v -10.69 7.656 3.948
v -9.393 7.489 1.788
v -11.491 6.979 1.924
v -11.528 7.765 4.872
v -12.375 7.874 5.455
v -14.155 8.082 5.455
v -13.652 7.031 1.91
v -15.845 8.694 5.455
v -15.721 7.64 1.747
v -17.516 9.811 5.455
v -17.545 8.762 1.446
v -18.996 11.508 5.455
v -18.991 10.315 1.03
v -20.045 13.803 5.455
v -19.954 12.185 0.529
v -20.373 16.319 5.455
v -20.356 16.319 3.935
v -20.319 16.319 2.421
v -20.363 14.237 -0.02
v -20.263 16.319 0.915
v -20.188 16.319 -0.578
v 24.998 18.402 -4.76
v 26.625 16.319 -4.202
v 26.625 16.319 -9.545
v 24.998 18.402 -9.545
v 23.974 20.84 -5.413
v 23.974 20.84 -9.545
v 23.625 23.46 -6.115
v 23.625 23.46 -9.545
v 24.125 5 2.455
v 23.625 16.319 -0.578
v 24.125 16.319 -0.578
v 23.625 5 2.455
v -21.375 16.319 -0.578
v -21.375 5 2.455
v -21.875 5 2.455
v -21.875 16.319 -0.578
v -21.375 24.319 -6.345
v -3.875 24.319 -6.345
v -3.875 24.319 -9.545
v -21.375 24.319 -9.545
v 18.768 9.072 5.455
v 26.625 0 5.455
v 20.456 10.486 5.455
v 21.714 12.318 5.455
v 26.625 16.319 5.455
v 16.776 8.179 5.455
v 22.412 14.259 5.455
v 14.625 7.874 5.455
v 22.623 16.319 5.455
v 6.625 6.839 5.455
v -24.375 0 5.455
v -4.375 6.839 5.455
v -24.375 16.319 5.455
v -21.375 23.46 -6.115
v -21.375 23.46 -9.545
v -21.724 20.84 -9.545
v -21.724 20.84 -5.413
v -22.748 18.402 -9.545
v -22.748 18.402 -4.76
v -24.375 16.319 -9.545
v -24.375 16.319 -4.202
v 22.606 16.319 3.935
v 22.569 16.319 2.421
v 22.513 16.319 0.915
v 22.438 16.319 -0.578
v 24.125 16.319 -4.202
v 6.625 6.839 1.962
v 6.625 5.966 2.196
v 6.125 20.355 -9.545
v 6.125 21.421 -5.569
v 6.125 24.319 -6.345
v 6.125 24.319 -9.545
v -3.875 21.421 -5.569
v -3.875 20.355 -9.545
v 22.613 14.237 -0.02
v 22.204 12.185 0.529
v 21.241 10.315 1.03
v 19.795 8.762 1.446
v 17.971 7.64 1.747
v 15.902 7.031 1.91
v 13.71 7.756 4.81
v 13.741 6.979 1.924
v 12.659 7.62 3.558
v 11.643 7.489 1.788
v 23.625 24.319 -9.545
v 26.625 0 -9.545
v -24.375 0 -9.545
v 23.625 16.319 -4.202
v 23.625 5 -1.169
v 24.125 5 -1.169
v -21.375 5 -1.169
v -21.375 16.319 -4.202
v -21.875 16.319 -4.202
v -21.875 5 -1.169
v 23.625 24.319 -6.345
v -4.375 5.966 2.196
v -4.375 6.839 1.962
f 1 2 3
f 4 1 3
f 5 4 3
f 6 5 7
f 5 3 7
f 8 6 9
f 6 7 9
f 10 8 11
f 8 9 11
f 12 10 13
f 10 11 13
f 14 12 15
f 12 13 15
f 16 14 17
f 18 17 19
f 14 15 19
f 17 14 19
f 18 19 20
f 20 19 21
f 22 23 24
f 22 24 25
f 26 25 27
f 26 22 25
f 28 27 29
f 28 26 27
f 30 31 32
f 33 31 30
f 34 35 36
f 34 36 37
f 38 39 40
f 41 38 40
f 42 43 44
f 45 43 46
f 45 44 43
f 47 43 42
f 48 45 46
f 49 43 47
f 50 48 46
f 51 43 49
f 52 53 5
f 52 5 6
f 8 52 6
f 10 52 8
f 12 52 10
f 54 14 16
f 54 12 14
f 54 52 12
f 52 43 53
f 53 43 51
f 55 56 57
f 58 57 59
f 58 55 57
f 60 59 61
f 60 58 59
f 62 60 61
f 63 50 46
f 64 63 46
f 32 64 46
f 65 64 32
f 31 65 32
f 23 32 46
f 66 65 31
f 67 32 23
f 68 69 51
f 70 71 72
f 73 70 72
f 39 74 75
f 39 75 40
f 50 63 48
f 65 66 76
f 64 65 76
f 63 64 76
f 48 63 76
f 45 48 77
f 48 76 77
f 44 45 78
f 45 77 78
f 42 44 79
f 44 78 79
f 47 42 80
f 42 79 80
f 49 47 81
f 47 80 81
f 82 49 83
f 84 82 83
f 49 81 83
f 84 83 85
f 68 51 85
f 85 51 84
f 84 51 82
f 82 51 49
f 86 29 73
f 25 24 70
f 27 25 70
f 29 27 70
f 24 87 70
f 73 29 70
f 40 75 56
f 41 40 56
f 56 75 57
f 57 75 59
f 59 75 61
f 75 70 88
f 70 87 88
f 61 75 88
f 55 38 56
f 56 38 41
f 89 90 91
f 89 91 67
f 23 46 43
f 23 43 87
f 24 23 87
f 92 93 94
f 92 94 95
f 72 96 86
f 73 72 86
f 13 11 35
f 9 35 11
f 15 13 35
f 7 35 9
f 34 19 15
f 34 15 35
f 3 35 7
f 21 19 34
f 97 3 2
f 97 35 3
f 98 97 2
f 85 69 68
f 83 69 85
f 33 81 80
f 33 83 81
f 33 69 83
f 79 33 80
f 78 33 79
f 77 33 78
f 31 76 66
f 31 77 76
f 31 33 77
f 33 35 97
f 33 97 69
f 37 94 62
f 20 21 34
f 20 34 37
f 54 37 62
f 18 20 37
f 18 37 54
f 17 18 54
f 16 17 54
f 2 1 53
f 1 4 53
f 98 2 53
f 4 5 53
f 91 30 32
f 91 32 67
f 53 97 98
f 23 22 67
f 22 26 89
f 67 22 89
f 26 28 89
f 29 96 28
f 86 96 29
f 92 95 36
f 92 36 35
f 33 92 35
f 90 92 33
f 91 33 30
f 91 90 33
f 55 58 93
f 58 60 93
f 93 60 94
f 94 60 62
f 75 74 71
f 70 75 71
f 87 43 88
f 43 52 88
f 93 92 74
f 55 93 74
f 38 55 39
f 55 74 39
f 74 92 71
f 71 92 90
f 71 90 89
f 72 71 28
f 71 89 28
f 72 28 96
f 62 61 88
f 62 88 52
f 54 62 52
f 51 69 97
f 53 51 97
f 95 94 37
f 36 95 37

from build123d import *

# Parameters (mm, degrees)
SKETCH1_W           = 45
SKETCH1_H           = 15
BOSS_EXTRUDE1_DEPTH = 5
BOSS_EXTRUDE2_DEPTH = 45
SKETCH5_R           = 8
CUT_EXTRUDE1_DEPTH  = 10
CUT_EXTRUDE2_REACH  = 39.075
SKETCH6_W           = 45
SKETCH6_H           = 8
SKETCH7_W           = 11
SKETCH7_H           = 10.717790556
CUT_EXTRUDE4_DEPTH  = 6.5
CUT_EXTRUDE5_REACH  = 39.075
SKETCH10_W          = 15
SKETCH10_H          = 16.318516526
BOSS_EXTRUDE3_DEPTH = 3
SKETCH11_W          = 15
SKETCH11_H          = 16.318516526
BOSS_EXTRUDE4_DEPTH = 3
SKETCH12_W          = 10
SKETCH12_H          = 7.679226714
CUT_EXTRUDE6_DEPTH  = 6
FILLET1_R           = 10
CUT_EXTRUDE7_DEPTH  = 0.5
CUT_EXTRUDE8_DEPTH  = 0.5


with BuildPart() as part:
    # Sketch1 → Boss-Extrude1 (new body)
    with BuildSketch(Plane(origin=(0, 0, 0), x_dir=(1, 0, 0), z_dir=(0, 1, 0))):
        with Locations((1.125, 2.045454545)):
            Rectangle(SKETCH1_W, SKETCH1_H)
    extrude(amount=BOSS_EXTRUDE1_DEPTH)

    # Sketch2 → Boss-Extrude2 (add)
    with BuildSketch(Plane(origin=(23.625, 0, 0), x_dir=(0, 0, -1), z_dir=(1, 0, 0))):
        Polygon((-2.454545455, 5), (2.721835448, 24.318516526), (-5.454545455, 24.318516526), (-5.454545455, 5), align=None)
        Polygon((1.168921177, 5), (6.345302079, 24.318516526), (9.545454545, 24.318516526), (9.545454545, 5), align=None)
    extrude(amount=-BOSS_EXTRUDE2_DEPTH)

    # Sketch5 → Cut-Extrude1 (cut)
    with BuildSketch(Plane(origin=(0, 0.948572854, 3.540122086), x_dir=(-1, 0, 0), z_dir=(0, -0.2588190451025247, -0.9659258262890673))):
        with Locations(Location((12.375, 14.194346021, 0), (0, 0, 90))):
            Circle(SKETCH5_R)
        with Locations(Location((-14.625, 14.194346021, 0), (0, 0, 90))):
            Circle(SKETCH5_R)
    extrude(amount=-CUT_EXTRUDE1_DEPTH, mode=Mode.SUBTRACT)

    # Cut-Extrude2: up to this plane
    cut_extrude2_end = Plane(origin=(-21.375, 5, 2.454545455), z_dir=(0, -0.2588190451025246, -0.9659258262890673))
    # Sketch6 → Cut-Extrude2 (cut, up to the surface)
    with BuildSketch(Plane.XY.offset(5.454545455), mode=Mode.PRIVATE) as cut_extrude2_sk1:
        with Locations((1.125, 20.318516526)):
            Rectangle(SKETCH6_W, SKETCH6_H)
    cut_extrude2_tool1 = split(extrude(cut_extrude2_sk1.sketch, amount=-CUT_EXTRUDE2_REACH, mode=Mode.PRIVATE), bisect_by=cut_extrude2_end, keep=Keep.BOTH, mode=Mode.PRIVATE)
    add(cut_extrude2_tool1.solids().sort_by_distance((1.125, 20.318517, 5.454545))[0], mode=Mode.SUBTRACT)

    # Sketch7 → Cut-Extrude4 (cut)
    with BuildSketch(Plane(origin=(0, 0.948572854, 3.540122086), x_dir=(-1, 0, 0), z_dir=(0, -0.2588190451025247, -0.9659258262890673))):
        with Locations((-1.125, 10.553241299)):
            Rectangle(SKETCH7_W, SKETCH7_H)
    extrude(amount=-CUT_EXTRUDE4_DEPTH, mode=Mode.SUBTRACT)


with BuildPart() as cut_extrude4_piece_1:
    # of the separate pieces the step leaves, piece 1, a body of its own (cut_extrude4_pieces)
    add(part.part.solids().sort_by_distance((-21.375, 0, -9.545454545))[0])


with BuildPart() as cut_extrude4_piece_2:
    # of the separate pieces the step leaves, piece 2, a body of its own (cut_extrude4_pieces)
    add(part.part.solids().sort_by_distance((-4.375, 16.318516526, -0.578241908))[0])


with BuildPart() as cut_extrude4_piece_3:
    # of the separate pieces the step leaves, piece 3, a body of its own (cut_extrude4_pieces)
    add(part.part.solids().sort_by_distance((6.811601533, 16.318516526, -0.578241908))[0])


with BuildPart() as cut_extrude5_tool:
    # Cut-Extrude5: up to this plane
    cut_extrude5_end = Plane(origin=(-21.375, 5, 2.454545455), z_dir=(0, -0.2588190451025246, -0.9659258262890673))
    # Sketch9 → Cut-Extrude5 (new, up to the surface)
    with BuildSketch(Plane.XY.offset(5.454545455), mode=Mode.PRIVATE) as cut_extrude5_sk1:
        Polygon((-12.375, 7.874399938), (-4.375, 6.839123758), (6.625, 6.839123758), (14.625, 7.874399938), (14.625, 17.142741254), (-12.375, 17.142741254), align=None)
    cut_extrude5_tool1 = split(extrude(cut_extrude5_sk1.sketch, amount=-CUT_EXTRUDE5_REACH, mode=Mode.PRIVATE), bisect_by=cut_extrude5_end, keep=Keep.BOTH, mode=Mode.PRIVATE)
    add(cut_extrude5_tool1.solids().sort_by_distance((1.125, 12.138424, 5.454545))[0])


with BuildPart() as cut_extrude4_piece_1_1:
    add(cut_extrude4_piece_1.part)

    # Cut-Extrude5: cut by cut_extrude5_tool
    add(cut_extrude5_tool.part, mode=Mode.SUBTRACT)

    # Sketch10 → Boss-Extrude3 (add)
    with BuildSketch(Plane.ZY.offset(21.375)):
        with Locations((-2.045454545, 8.159258263)):
            Rectangle(SKETCH10_W, SKETCH10_H)
    extrude(amount=BOSS_EXTRUDE3_DEPTH)

    # Sketch11 → Boss-Extrude4 (add)
    with BuildSketch(Plane(origin=(23.625, 0, 0), x_dir=(0, 0, -1), z_dir=(1, 0, 0))):
        with Locations((2.045454545, 8.159258263)):
            Rectangle(SKETCH11_W, SKETCH11_H)
    extrude(amount=BOSS_EXTRUDE4_DEPTH)

    # Sketch12 → Cut-Extrude6 (cut)
    with BuildSketch(Plane(origin=(0, 0.042706196, 0.159381694), x_dir=(1, 0, 0), z_dir=(0, 0.2588190451025247, 0.9659258262890673))):
        with Locations((1.125, 25.971781551)):
            Rectangle(SKETCH12_W, SKETCH12_H)
    extrude(amount=-CUT_EXTRUDE6_DEPTH, mode=Mode.SUBTRACT)

    # Fillet1
    # the kernel refuses this fillet: 10 mm, written as the material it adds along each edge
    with BuildSketch(Plane(origin=(-21.375, 16.318516526, 13.651862532), x_dir=(-1, 0, 0), z_dir=(0, 0, -1))) as fillet1_piece_1_section:
        with BuildLine():
            CenterArc((10, 7.141428429), FILLET1_R, 180, 45.572995999)
            Line((0, 7.141428429), (0, 0))
            Line((0, 0), (3, 0))
        make_face()
    fillet1_piece_1 = extrude(amount=23.197317077, mode=Mode.PRIVATE)
    fillet1_piece_1 = split(fillet1_piece_1, bisect_by=Plane(origin=(-22.137016454, 20.028758468, -5.195864872), z_dir=(0, -0.2588190451025247, -0.9659258262890673)), keep=Keep.TOP, mode=Mode.PRIVATE)
    add(fillet1_piece_1)
    with BuildSketch(Plane(origin=(23.625, 16.318516526, 13.651862532), x_dir=(1, 0, 0), z_dir=(0, 0, -1))) as fillet1_piece_2_section:
        with BuildLine():
            CenterArc((10, -7.141428429), FILLET1_R, 134.427004001, 45.572995999)
            Line((0, -7.141428429), (0, 0))
            Line((0, 0), (3, 0))
        make_face()
    fillet1_piece_2 = extrude(amount=23.197317077, mode=Mode.PRIVATE)
    fillet1_piece_2 = split(fillet1_piece_2, bisect_by=Plane(origin=(24.387016454, 20.028758468, -5.195864872), z_dir=(0, -0.2588190451025247, -0.9659258262890673)), keep=Keep.TOP, mode=Mode.PRIVATE)
    add(fillet1_piece_2)

    # Sketch14 → Cut-Extrude7 (cut)
    with BuildSketch(Plane(origin=(-21.375, 0, 0), x_dir=(0, 0, -1), z_dir=(1, 0, 0))):
        Polygon((0.578241908, 16.318516526), (4.201708539, 16.318516526), (1.168921177, 5), (-2.454545455, 5), align=None)
    extrude(amount=-CUT_EXTRUDE7_DEPTH, mode=Mode.SUBTRACT)

    # Sketch15 → Cut-Extrude8 (cut)
    with BuildSketch(Plane.ZY.offset(-23.625)):
        Polygon((-4.201708539, 16.318516526), (-0.578241908, 16.318516526), (2.454545455, 5), (-1.168921177, 5), align=None)
    extrude(amount=-CUT_EXTRUDE8_DEPTH, mode=Mode.SUBTRACT)


with BuildPart() as cut_extrude4_piece_2_1:
    add(cut_extrude4_piece_2.part)

    # Cut-Extrude5: cut by cut_extrude5_tool
    add(cut_extrude5_tool.part, mode=Mode.SUBTRACT)


with BuildPart() as cut_extrude4_piece_3_1:
    add(cut_extrude4_piece_3.part)

    # Cut-Extrude5: cut by cut_extrude5_tool
    add(cut_extrude5_tool.part, mode=Mode.SUBTRACT)


solid = cut_extrude4_piece_1_1.part
